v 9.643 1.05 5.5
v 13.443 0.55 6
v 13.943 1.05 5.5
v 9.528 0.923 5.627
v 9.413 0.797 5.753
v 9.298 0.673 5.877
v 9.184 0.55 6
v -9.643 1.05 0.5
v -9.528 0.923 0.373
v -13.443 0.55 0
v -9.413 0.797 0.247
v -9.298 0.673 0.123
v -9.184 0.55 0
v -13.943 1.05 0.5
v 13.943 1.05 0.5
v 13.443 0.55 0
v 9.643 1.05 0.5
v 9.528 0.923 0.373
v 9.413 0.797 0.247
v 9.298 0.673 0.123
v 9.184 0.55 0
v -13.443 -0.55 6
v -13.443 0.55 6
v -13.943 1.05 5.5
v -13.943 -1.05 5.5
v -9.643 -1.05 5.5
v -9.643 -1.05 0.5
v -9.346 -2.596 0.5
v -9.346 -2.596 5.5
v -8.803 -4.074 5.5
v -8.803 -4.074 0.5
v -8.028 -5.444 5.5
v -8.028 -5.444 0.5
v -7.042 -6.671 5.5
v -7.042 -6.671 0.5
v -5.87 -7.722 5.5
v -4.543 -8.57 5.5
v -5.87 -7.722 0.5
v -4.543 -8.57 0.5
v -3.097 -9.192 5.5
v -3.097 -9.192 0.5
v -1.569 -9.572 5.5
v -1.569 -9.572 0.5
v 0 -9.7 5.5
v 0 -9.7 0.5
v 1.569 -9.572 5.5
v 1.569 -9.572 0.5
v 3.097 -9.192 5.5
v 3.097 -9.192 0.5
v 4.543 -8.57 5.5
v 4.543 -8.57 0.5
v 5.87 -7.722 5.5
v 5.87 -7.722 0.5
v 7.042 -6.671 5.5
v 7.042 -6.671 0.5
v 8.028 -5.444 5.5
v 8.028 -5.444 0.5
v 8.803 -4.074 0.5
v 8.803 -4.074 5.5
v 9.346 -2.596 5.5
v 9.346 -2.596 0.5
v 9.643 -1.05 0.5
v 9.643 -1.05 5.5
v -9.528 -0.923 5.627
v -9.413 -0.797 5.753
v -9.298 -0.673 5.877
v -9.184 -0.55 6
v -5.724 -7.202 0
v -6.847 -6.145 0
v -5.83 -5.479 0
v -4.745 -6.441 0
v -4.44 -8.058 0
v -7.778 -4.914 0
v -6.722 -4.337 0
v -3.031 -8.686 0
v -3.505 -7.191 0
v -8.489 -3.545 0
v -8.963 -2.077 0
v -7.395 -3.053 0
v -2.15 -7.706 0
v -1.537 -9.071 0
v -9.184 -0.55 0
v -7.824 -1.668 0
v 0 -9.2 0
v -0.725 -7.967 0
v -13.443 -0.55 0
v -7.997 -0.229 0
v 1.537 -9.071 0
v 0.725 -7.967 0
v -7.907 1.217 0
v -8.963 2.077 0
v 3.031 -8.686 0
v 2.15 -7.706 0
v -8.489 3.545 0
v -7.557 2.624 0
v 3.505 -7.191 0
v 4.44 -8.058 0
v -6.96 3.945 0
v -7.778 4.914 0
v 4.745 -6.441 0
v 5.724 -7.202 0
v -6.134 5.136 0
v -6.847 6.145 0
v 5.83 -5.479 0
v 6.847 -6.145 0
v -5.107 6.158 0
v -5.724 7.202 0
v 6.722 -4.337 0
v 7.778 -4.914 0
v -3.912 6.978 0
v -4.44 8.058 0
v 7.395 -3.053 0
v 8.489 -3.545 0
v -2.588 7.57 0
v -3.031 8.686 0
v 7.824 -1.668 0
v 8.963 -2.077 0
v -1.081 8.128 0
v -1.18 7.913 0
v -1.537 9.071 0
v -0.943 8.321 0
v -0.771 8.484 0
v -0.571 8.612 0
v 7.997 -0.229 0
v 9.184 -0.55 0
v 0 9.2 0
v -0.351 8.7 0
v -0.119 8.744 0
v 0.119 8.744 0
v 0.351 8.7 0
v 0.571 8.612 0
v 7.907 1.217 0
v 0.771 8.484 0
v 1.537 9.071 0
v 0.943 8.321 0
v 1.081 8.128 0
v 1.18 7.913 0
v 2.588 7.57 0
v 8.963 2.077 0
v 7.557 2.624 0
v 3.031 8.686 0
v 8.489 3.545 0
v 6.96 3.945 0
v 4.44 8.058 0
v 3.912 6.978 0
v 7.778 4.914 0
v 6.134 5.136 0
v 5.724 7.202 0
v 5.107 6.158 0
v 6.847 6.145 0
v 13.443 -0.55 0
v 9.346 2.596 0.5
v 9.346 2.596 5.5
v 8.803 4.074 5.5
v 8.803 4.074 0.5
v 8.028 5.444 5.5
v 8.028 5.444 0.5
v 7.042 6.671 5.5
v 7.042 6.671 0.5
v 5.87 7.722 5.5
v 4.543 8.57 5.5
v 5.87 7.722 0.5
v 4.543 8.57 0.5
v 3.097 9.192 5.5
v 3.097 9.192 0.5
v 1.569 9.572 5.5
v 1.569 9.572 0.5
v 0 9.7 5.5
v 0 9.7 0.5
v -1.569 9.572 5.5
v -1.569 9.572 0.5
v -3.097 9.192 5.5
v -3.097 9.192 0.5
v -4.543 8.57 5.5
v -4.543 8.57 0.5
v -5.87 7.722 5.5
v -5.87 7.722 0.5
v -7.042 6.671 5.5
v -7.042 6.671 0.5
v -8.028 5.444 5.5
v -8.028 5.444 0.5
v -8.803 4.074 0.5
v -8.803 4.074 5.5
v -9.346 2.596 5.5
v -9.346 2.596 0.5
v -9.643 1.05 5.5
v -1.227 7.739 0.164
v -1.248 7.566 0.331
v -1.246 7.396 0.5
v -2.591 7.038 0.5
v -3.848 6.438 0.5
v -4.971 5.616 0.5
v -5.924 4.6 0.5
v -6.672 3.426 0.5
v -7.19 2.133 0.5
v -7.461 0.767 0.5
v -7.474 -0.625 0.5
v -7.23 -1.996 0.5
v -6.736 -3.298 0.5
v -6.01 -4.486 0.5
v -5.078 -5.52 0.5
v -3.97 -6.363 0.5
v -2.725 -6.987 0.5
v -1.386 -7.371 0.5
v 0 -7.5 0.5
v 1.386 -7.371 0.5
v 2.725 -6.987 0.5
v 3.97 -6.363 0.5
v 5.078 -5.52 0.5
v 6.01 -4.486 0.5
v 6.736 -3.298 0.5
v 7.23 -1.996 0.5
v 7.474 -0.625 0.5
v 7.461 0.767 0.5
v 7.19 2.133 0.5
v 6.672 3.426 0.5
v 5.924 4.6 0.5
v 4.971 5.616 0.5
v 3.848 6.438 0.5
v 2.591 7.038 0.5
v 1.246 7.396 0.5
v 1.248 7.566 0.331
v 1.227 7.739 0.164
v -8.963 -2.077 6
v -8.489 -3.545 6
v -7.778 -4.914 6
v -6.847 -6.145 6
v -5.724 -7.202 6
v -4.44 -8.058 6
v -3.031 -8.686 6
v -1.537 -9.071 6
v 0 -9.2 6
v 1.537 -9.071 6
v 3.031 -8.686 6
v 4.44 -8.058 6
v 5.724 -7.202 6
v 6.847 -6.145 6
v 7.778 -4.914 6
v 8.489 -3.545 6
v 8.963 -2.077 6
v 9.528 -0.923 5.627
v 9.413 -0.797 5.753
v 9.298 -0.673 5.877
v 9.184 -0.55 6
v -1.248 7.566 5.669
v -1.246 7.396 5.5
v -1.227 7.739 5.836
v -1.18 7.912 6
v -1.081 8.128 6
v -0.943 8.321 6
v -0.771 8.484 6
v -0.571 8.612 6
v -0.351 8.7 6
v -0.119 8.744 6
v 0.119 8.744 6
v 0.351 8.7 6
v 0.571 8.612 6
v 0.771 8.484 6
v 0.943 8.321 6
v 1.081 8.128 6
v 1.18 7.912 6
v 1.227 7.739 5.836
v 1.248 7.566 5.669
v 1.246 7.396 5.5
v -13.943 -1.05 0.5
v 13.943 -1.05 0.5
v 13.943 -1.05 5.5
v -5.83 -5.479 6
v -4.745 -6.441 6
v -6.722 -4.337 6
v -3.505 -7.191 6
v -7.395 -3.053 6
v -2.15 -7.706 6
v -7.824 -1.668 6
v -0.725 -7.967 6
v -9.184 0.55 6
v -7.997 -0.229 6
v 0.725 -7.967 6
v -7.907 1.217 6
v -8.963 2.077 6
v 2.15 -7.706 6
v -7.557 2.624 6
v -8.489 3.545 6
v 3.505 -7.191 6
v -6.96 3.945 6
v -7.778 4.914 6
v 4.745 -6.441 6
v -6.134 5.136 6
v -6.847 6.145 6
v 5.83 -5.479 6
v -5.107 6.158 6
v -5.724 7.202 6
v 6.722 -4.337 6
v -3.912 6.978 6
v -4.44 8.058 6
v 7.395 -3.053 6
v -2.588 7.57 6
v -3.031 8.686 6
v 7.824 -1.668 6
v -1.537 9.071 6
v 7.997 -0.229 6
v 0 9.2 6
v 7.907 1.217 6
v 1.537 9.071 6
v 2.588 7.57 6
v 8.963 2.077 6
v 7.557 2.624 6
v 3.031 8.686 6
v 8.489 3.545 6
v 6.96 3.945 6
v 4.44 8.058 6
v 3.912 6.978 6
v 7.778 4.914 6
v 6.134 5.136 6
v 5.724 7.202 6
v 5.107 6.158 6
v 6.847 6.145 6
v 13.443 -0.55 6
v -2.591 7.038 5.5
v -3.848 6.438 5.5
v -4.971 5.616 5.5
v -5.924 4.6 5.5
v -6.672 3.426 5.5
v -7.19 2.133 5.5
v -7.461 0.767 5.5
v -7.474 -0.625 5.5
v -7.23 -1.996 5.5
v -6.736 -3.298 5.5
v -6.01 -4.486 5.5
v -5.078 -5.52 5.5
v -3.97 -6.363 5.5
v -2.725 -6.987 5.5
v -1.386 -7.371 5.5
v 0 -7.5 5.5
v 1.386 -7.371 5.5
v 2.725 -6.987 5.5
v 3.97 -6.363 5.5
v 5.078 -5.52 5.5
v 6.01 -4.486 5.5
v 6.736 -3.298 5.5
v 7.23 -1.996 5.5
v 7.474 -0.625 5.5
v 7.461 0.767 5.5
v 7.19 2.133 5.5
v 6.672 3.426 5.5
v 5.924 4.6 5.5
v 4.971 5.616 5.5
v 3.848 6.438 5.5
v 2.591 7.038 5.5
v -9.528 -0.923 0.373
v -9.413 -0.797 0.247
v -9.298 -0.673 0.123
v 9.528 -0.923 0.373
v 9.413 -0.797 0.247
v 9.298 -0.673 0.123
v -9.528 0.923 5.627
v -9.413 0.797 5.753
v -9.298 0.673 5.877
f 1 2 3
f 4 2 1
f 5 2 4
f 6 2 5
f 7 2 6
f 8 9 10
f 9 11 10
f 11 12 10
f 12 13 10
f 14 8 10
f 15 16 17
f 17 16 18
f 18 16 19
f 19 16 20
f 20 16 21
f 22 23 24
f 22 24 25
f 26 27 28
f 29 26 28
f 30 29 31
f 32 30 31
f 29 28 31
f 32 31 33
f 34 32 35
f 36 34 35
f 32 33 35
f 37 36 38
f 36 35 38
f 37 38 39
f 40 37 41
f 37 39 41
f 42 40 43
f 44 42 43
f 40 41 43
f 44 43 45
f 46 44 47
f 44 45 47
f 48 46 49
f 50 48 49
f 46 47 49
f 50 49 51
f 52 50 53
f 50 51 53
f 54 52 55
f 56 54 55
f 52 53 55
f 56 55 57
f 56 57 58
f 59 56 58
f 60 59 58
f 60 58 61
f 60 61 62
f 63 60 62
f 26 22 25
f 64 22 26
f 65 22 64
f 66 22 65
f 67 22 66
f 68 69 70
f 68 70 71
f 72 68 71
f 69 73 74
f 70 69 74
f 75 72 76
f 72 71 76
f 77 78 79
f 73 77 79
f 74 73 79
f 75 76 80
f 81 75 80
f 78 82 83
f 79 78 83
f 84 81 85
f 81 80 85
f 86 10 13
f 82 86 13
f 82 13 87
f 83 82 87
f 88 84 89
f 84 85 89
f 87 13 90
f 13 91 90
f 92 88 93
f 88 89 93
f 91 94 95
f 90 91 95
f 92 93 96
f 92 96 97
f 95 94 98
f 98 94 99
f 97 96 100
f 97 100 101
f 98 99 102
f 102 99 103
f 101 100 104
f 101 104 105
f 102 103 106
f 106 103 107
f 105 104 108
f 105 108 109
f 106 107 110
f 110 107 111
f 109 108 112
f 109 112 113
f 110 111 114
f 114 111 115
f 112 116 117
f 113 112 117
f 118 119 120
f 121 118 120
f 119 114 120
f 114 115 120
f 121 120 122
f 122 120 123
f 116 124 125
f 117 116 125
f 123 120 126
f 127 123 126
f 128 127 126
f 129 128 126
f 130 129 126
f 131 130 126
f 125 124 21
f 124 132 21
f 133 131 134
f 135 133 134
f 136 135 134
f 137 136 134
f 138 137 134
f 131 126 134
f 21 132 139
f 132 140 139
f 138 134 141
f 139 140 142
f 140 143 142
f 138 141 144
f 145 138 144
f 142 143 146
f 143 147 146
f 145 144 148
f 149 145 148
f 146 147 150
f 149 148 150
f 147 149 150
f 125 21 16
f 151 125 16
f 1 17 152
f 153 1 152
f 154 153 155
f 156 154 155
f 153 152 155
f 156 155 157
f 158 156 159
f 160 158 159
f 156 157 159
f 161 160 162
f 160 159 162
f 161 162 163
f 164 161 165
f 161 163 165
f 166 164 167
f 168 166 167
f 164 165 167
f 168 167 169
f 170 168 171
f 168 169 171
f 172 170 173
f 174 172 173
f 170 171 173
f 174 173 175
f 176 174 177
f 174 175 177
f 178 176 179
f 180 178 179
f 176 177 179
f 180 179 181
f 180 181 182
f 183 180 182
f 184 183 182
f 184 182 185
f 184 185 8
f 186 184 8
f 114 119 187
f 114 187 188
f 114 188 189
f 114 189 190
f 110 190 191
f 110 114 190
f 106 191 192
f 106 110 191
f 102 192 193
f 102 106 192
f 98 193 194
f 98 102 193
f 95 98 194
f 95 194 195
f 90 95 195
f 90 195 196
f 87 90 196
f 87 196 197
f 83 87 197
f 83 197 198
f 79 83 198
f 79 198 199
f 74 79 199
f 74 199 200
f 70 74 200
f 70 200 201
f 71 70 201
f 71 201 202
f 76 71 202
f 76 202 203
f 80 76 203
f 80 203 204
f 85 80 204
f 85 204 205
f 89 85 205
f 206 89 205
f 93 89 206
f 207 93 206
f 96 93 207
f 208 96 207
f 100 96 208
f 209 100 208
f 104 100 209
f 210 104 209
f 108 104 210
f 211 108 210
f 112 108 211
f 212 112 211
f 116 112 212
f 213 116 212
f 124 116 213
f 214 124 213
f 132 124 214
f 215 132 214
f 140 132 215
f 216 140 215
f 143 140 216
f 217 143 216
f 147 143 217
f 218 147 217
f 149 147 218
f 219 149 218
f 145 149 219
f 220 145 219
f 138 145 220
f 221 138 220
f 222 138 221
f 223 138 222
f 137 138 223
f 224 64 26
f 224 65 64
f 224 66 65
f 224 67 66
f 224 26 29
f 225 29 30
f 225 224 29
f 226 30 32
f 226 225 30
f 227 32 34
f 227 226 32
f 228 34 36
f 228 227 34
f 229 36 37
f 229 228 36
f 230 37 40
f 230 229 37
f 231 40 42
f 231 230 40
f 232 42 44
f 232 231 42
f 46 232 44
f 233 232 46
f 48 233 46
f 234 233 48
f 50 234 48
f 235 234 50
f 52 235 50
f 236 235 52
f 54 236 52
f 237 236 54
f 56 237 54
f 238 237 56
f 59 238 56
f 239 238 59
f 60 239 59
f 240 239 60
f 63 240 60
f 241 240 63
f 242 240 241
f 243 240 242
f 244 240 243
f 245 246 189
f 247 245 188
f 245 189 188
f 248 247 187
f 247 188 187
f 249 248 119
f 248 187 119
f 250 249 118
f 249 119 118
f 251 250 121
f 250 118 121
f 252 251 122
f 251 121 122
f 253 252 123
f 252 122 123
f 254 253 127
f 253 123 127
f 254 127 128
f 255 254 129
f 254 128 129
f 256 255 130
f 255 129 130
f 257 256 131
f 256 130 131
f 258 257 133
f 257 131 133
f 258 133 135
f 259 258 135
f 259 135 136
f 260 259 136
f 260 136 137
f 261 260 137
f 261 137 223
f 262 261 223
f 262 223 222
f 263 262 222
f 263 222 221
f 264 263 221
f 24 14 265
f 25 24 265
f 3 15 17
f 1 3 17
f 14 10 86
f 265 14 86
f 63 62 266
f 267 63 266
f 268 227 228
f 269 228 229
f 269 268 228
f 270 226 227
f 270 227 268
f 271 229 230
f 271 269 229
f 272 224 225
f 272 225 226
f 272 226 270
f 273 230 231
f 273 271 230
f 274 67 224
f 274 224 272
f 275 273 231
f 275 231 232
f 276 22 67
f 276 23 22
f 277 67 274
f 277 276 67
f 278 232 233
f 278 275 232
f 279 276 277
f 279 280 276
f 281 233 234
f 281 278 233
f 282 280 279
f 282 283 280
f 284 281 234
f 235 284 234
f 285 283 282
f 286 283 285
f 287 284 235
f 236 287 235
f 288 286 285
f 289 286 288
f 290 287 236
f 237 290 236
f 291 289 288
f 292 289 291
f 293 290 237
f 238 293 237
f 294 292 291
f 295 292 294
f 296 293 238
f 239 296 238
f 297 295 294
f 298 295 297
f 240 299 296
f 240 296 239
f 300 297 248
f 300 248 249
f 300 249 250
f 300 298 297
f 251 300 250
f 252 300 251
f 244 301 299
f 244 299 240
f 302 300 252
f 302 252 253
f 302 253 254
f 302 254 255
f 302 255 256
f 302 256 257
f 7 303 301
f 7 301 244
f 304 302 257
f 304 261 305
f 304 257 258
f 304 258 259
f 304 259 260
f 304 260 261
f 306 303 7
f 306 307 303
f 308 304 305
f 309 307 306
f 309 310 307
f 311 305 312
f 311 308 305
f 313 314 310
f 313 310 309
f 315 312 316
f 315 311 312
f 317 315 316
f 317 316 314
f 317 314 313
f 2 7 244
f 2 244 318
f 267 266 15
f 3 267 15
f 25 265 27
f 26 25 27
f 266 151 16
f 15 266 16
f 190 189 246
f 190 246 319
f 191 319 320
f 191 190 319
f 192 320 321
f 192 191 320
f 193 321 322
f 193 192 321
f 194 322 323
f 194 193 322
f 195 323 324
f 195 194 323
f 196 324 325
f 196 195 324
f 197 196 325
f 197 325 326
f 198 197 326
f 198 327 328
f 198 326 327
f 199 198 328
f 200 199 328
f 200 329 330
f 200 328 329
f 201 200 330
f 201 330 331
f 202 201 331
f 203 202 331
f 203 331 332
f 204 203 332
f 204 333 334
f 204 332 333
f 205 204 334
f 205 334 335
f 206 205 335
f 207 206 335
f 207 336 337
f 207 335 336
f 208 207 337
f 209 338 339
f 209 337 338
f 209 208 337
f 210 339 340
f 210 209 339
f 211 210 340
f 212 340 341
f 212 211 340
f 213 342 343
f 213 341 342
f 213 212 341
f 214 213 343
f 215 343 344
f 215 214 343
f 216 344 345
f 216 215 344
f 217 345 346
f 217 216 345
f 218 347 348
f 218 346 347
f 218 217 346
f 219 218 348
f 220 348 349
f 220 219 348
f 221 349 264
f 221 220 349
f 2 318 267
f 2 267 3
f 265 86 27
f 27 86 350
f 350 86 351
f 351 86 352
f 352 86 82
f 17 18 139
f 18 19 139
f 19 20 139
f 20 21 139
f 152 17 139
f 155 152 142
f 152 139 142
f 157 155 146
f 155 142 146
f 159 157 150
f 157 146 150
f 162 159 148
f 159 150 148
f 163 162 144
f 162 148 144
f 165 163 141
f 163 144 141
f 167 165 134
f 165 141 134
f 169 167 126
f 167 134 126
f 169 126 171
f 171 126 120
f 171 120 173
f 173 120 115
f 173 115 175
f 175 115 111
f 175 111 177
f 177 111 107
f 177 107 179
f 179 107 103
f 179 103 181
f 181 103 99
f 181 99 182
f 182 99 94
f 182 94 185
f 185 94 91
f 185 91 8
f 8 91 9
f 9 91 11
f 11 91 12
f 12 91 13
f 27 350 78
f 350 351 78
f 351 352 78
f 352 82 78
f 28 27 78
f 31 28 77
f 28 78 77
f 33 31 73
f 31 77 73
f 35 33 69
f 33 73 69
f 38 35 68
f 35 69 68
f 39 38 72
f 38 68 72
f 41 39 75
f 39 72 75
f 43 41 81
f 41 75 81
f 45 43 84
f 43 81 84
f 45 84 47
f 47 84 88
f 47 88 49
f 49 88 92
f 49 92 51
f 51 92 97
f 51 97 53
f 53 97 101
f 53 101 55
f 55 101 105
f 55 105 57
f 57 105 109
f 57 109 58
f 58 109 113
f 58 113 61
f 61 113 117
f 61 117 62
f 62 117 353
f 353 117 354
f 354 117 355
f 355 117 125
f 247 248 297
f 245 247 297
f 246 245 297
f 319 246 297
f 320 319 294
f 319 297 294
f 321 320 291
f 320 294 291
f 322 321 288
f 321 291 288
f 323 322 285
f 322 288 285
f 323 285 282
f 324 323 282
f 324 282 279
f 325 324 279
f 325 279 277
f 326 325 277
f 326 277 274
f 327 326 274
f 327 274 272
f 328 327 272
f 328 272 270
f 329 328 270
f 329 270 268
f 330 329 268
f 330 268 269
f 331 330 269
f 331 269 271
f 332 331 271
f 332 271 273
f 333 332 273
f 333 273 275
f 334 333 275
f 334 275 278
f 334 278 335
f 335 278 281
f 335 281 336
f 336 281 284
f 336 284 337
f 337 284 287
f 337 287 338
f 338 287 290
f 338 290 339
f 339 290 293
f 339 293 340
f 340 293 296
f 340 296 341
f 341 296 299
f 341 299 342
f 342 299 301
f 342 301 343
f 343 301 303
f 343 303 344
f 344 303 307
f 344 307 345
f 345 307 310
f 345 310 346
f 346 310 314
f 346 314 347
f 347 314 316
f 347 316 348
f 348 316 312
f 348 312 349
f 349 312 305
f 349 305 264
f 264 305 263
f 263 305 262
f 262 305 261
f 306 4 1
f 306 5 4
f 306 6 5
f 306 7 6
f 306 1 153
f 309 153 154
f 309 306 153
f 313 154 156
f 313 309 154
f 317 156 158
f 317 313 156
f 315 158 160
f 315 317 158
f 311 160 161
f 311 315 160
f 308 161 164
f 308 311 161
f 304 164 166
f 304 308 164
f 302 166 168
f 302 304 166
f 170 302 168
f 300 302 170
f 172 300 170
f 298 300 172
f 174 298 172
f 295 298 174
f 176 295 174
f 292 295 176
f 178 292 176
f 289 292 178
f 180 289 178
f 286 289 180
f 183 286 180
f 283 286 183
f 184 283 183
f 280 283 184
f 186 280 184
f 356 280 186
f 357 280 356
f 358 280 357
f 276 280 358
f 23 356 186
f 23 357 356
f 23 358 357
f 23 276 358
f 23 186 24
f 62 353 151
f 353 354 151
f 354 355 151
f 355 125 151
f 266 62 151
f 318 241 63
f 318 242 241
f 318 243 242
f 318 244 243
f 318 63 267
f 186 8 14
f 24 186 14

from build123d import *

# Parameters (mm, degrees)
SKETCH1_R           = 7.5
BOSS_EXTRUDE1_DEPTH = 6
CHAMFER1_SIZE       = 0.5
SKETCH2_R           = 1.25
CUT_EXTRUDE1_DEPTH  = 10


with BuildPart() as part:
    # Sketch1 → Boss-Extrude1 (new body)
    with BuildSketch(Plane.XY):
        with BuildLine():
            Line((9.643002644, -1.05), (13.943002644, -1.05))
            Line((13.943002644, -1.05), (13.943002644, 1.05))
            Line((13.943002644, 1.05), (9.643002644, 1.05))
            ThreePointArc((9.643002644, 1.05), (0, 9.7), (-9.643002644, 1.05))
            Line((-9.643002644, 1.05), (-13.943002644, 1.05))
            Line((-13.943002644, 1.05), (-13.943002644, -1.05))
            Line((-13.943002644, -1.05), (-9.643002644, -1.05))
            ThreePointArc((-9.643002644, -1.05), (0, -9.7), (9.643002644, -1.05))
        make_face()
        Circle(SKETCH1_R, mode=Mode.SUBTRACT)
    extrude(amount=BOSS_EXTRUDE1_DEPTH)

    # Chamfer1
    chamfer1_edges = [part.edges().sort_by_distance(p)[0] for p in [
        (0, -9.7, 0),
        (-11.793002644, -1.05, 0),
        (-13.943002644, 0, 0),
        (-11.793002644, 1.05, 0),
        (-11.793002644, -1.05, 6),
        (0, -9.7, 6),
        (11.793002644, -1.05, 6),
        (-7.5, 0, 0),
        (-7.5, 0, 6),
        (13.943002644, 0, 6),
        (11.793002644, 1.05, 6),
        (0, 9.7, 6),
        (-11.793002644, 1.05, 6),
        (0, 9.7, 0),
        (-13.943002644, 0, 6),
        (11.793002644, 1.05, 0),
        (13.943002644, 0, 0),
        (11.793002644, -1.05, 0),
    ]]
    chamfer(chamfer1_edges, length=CHAMFER1_SIZE)

    # Sketch2 → Cut-Extrude1 (cut)
    with BuildSketch(Plane(origin=(0, 0, 0), x_dir=(-1, 0, 0), z_dir=(0, 0, -1))):
        with Locations((0, 7.5)):
            Circle(SKETCH2_R)
    extrude(amount=-CUT_EXTRUDE1_DEPTH, mode=Mode.SUBTRACT)


solid = part.part
